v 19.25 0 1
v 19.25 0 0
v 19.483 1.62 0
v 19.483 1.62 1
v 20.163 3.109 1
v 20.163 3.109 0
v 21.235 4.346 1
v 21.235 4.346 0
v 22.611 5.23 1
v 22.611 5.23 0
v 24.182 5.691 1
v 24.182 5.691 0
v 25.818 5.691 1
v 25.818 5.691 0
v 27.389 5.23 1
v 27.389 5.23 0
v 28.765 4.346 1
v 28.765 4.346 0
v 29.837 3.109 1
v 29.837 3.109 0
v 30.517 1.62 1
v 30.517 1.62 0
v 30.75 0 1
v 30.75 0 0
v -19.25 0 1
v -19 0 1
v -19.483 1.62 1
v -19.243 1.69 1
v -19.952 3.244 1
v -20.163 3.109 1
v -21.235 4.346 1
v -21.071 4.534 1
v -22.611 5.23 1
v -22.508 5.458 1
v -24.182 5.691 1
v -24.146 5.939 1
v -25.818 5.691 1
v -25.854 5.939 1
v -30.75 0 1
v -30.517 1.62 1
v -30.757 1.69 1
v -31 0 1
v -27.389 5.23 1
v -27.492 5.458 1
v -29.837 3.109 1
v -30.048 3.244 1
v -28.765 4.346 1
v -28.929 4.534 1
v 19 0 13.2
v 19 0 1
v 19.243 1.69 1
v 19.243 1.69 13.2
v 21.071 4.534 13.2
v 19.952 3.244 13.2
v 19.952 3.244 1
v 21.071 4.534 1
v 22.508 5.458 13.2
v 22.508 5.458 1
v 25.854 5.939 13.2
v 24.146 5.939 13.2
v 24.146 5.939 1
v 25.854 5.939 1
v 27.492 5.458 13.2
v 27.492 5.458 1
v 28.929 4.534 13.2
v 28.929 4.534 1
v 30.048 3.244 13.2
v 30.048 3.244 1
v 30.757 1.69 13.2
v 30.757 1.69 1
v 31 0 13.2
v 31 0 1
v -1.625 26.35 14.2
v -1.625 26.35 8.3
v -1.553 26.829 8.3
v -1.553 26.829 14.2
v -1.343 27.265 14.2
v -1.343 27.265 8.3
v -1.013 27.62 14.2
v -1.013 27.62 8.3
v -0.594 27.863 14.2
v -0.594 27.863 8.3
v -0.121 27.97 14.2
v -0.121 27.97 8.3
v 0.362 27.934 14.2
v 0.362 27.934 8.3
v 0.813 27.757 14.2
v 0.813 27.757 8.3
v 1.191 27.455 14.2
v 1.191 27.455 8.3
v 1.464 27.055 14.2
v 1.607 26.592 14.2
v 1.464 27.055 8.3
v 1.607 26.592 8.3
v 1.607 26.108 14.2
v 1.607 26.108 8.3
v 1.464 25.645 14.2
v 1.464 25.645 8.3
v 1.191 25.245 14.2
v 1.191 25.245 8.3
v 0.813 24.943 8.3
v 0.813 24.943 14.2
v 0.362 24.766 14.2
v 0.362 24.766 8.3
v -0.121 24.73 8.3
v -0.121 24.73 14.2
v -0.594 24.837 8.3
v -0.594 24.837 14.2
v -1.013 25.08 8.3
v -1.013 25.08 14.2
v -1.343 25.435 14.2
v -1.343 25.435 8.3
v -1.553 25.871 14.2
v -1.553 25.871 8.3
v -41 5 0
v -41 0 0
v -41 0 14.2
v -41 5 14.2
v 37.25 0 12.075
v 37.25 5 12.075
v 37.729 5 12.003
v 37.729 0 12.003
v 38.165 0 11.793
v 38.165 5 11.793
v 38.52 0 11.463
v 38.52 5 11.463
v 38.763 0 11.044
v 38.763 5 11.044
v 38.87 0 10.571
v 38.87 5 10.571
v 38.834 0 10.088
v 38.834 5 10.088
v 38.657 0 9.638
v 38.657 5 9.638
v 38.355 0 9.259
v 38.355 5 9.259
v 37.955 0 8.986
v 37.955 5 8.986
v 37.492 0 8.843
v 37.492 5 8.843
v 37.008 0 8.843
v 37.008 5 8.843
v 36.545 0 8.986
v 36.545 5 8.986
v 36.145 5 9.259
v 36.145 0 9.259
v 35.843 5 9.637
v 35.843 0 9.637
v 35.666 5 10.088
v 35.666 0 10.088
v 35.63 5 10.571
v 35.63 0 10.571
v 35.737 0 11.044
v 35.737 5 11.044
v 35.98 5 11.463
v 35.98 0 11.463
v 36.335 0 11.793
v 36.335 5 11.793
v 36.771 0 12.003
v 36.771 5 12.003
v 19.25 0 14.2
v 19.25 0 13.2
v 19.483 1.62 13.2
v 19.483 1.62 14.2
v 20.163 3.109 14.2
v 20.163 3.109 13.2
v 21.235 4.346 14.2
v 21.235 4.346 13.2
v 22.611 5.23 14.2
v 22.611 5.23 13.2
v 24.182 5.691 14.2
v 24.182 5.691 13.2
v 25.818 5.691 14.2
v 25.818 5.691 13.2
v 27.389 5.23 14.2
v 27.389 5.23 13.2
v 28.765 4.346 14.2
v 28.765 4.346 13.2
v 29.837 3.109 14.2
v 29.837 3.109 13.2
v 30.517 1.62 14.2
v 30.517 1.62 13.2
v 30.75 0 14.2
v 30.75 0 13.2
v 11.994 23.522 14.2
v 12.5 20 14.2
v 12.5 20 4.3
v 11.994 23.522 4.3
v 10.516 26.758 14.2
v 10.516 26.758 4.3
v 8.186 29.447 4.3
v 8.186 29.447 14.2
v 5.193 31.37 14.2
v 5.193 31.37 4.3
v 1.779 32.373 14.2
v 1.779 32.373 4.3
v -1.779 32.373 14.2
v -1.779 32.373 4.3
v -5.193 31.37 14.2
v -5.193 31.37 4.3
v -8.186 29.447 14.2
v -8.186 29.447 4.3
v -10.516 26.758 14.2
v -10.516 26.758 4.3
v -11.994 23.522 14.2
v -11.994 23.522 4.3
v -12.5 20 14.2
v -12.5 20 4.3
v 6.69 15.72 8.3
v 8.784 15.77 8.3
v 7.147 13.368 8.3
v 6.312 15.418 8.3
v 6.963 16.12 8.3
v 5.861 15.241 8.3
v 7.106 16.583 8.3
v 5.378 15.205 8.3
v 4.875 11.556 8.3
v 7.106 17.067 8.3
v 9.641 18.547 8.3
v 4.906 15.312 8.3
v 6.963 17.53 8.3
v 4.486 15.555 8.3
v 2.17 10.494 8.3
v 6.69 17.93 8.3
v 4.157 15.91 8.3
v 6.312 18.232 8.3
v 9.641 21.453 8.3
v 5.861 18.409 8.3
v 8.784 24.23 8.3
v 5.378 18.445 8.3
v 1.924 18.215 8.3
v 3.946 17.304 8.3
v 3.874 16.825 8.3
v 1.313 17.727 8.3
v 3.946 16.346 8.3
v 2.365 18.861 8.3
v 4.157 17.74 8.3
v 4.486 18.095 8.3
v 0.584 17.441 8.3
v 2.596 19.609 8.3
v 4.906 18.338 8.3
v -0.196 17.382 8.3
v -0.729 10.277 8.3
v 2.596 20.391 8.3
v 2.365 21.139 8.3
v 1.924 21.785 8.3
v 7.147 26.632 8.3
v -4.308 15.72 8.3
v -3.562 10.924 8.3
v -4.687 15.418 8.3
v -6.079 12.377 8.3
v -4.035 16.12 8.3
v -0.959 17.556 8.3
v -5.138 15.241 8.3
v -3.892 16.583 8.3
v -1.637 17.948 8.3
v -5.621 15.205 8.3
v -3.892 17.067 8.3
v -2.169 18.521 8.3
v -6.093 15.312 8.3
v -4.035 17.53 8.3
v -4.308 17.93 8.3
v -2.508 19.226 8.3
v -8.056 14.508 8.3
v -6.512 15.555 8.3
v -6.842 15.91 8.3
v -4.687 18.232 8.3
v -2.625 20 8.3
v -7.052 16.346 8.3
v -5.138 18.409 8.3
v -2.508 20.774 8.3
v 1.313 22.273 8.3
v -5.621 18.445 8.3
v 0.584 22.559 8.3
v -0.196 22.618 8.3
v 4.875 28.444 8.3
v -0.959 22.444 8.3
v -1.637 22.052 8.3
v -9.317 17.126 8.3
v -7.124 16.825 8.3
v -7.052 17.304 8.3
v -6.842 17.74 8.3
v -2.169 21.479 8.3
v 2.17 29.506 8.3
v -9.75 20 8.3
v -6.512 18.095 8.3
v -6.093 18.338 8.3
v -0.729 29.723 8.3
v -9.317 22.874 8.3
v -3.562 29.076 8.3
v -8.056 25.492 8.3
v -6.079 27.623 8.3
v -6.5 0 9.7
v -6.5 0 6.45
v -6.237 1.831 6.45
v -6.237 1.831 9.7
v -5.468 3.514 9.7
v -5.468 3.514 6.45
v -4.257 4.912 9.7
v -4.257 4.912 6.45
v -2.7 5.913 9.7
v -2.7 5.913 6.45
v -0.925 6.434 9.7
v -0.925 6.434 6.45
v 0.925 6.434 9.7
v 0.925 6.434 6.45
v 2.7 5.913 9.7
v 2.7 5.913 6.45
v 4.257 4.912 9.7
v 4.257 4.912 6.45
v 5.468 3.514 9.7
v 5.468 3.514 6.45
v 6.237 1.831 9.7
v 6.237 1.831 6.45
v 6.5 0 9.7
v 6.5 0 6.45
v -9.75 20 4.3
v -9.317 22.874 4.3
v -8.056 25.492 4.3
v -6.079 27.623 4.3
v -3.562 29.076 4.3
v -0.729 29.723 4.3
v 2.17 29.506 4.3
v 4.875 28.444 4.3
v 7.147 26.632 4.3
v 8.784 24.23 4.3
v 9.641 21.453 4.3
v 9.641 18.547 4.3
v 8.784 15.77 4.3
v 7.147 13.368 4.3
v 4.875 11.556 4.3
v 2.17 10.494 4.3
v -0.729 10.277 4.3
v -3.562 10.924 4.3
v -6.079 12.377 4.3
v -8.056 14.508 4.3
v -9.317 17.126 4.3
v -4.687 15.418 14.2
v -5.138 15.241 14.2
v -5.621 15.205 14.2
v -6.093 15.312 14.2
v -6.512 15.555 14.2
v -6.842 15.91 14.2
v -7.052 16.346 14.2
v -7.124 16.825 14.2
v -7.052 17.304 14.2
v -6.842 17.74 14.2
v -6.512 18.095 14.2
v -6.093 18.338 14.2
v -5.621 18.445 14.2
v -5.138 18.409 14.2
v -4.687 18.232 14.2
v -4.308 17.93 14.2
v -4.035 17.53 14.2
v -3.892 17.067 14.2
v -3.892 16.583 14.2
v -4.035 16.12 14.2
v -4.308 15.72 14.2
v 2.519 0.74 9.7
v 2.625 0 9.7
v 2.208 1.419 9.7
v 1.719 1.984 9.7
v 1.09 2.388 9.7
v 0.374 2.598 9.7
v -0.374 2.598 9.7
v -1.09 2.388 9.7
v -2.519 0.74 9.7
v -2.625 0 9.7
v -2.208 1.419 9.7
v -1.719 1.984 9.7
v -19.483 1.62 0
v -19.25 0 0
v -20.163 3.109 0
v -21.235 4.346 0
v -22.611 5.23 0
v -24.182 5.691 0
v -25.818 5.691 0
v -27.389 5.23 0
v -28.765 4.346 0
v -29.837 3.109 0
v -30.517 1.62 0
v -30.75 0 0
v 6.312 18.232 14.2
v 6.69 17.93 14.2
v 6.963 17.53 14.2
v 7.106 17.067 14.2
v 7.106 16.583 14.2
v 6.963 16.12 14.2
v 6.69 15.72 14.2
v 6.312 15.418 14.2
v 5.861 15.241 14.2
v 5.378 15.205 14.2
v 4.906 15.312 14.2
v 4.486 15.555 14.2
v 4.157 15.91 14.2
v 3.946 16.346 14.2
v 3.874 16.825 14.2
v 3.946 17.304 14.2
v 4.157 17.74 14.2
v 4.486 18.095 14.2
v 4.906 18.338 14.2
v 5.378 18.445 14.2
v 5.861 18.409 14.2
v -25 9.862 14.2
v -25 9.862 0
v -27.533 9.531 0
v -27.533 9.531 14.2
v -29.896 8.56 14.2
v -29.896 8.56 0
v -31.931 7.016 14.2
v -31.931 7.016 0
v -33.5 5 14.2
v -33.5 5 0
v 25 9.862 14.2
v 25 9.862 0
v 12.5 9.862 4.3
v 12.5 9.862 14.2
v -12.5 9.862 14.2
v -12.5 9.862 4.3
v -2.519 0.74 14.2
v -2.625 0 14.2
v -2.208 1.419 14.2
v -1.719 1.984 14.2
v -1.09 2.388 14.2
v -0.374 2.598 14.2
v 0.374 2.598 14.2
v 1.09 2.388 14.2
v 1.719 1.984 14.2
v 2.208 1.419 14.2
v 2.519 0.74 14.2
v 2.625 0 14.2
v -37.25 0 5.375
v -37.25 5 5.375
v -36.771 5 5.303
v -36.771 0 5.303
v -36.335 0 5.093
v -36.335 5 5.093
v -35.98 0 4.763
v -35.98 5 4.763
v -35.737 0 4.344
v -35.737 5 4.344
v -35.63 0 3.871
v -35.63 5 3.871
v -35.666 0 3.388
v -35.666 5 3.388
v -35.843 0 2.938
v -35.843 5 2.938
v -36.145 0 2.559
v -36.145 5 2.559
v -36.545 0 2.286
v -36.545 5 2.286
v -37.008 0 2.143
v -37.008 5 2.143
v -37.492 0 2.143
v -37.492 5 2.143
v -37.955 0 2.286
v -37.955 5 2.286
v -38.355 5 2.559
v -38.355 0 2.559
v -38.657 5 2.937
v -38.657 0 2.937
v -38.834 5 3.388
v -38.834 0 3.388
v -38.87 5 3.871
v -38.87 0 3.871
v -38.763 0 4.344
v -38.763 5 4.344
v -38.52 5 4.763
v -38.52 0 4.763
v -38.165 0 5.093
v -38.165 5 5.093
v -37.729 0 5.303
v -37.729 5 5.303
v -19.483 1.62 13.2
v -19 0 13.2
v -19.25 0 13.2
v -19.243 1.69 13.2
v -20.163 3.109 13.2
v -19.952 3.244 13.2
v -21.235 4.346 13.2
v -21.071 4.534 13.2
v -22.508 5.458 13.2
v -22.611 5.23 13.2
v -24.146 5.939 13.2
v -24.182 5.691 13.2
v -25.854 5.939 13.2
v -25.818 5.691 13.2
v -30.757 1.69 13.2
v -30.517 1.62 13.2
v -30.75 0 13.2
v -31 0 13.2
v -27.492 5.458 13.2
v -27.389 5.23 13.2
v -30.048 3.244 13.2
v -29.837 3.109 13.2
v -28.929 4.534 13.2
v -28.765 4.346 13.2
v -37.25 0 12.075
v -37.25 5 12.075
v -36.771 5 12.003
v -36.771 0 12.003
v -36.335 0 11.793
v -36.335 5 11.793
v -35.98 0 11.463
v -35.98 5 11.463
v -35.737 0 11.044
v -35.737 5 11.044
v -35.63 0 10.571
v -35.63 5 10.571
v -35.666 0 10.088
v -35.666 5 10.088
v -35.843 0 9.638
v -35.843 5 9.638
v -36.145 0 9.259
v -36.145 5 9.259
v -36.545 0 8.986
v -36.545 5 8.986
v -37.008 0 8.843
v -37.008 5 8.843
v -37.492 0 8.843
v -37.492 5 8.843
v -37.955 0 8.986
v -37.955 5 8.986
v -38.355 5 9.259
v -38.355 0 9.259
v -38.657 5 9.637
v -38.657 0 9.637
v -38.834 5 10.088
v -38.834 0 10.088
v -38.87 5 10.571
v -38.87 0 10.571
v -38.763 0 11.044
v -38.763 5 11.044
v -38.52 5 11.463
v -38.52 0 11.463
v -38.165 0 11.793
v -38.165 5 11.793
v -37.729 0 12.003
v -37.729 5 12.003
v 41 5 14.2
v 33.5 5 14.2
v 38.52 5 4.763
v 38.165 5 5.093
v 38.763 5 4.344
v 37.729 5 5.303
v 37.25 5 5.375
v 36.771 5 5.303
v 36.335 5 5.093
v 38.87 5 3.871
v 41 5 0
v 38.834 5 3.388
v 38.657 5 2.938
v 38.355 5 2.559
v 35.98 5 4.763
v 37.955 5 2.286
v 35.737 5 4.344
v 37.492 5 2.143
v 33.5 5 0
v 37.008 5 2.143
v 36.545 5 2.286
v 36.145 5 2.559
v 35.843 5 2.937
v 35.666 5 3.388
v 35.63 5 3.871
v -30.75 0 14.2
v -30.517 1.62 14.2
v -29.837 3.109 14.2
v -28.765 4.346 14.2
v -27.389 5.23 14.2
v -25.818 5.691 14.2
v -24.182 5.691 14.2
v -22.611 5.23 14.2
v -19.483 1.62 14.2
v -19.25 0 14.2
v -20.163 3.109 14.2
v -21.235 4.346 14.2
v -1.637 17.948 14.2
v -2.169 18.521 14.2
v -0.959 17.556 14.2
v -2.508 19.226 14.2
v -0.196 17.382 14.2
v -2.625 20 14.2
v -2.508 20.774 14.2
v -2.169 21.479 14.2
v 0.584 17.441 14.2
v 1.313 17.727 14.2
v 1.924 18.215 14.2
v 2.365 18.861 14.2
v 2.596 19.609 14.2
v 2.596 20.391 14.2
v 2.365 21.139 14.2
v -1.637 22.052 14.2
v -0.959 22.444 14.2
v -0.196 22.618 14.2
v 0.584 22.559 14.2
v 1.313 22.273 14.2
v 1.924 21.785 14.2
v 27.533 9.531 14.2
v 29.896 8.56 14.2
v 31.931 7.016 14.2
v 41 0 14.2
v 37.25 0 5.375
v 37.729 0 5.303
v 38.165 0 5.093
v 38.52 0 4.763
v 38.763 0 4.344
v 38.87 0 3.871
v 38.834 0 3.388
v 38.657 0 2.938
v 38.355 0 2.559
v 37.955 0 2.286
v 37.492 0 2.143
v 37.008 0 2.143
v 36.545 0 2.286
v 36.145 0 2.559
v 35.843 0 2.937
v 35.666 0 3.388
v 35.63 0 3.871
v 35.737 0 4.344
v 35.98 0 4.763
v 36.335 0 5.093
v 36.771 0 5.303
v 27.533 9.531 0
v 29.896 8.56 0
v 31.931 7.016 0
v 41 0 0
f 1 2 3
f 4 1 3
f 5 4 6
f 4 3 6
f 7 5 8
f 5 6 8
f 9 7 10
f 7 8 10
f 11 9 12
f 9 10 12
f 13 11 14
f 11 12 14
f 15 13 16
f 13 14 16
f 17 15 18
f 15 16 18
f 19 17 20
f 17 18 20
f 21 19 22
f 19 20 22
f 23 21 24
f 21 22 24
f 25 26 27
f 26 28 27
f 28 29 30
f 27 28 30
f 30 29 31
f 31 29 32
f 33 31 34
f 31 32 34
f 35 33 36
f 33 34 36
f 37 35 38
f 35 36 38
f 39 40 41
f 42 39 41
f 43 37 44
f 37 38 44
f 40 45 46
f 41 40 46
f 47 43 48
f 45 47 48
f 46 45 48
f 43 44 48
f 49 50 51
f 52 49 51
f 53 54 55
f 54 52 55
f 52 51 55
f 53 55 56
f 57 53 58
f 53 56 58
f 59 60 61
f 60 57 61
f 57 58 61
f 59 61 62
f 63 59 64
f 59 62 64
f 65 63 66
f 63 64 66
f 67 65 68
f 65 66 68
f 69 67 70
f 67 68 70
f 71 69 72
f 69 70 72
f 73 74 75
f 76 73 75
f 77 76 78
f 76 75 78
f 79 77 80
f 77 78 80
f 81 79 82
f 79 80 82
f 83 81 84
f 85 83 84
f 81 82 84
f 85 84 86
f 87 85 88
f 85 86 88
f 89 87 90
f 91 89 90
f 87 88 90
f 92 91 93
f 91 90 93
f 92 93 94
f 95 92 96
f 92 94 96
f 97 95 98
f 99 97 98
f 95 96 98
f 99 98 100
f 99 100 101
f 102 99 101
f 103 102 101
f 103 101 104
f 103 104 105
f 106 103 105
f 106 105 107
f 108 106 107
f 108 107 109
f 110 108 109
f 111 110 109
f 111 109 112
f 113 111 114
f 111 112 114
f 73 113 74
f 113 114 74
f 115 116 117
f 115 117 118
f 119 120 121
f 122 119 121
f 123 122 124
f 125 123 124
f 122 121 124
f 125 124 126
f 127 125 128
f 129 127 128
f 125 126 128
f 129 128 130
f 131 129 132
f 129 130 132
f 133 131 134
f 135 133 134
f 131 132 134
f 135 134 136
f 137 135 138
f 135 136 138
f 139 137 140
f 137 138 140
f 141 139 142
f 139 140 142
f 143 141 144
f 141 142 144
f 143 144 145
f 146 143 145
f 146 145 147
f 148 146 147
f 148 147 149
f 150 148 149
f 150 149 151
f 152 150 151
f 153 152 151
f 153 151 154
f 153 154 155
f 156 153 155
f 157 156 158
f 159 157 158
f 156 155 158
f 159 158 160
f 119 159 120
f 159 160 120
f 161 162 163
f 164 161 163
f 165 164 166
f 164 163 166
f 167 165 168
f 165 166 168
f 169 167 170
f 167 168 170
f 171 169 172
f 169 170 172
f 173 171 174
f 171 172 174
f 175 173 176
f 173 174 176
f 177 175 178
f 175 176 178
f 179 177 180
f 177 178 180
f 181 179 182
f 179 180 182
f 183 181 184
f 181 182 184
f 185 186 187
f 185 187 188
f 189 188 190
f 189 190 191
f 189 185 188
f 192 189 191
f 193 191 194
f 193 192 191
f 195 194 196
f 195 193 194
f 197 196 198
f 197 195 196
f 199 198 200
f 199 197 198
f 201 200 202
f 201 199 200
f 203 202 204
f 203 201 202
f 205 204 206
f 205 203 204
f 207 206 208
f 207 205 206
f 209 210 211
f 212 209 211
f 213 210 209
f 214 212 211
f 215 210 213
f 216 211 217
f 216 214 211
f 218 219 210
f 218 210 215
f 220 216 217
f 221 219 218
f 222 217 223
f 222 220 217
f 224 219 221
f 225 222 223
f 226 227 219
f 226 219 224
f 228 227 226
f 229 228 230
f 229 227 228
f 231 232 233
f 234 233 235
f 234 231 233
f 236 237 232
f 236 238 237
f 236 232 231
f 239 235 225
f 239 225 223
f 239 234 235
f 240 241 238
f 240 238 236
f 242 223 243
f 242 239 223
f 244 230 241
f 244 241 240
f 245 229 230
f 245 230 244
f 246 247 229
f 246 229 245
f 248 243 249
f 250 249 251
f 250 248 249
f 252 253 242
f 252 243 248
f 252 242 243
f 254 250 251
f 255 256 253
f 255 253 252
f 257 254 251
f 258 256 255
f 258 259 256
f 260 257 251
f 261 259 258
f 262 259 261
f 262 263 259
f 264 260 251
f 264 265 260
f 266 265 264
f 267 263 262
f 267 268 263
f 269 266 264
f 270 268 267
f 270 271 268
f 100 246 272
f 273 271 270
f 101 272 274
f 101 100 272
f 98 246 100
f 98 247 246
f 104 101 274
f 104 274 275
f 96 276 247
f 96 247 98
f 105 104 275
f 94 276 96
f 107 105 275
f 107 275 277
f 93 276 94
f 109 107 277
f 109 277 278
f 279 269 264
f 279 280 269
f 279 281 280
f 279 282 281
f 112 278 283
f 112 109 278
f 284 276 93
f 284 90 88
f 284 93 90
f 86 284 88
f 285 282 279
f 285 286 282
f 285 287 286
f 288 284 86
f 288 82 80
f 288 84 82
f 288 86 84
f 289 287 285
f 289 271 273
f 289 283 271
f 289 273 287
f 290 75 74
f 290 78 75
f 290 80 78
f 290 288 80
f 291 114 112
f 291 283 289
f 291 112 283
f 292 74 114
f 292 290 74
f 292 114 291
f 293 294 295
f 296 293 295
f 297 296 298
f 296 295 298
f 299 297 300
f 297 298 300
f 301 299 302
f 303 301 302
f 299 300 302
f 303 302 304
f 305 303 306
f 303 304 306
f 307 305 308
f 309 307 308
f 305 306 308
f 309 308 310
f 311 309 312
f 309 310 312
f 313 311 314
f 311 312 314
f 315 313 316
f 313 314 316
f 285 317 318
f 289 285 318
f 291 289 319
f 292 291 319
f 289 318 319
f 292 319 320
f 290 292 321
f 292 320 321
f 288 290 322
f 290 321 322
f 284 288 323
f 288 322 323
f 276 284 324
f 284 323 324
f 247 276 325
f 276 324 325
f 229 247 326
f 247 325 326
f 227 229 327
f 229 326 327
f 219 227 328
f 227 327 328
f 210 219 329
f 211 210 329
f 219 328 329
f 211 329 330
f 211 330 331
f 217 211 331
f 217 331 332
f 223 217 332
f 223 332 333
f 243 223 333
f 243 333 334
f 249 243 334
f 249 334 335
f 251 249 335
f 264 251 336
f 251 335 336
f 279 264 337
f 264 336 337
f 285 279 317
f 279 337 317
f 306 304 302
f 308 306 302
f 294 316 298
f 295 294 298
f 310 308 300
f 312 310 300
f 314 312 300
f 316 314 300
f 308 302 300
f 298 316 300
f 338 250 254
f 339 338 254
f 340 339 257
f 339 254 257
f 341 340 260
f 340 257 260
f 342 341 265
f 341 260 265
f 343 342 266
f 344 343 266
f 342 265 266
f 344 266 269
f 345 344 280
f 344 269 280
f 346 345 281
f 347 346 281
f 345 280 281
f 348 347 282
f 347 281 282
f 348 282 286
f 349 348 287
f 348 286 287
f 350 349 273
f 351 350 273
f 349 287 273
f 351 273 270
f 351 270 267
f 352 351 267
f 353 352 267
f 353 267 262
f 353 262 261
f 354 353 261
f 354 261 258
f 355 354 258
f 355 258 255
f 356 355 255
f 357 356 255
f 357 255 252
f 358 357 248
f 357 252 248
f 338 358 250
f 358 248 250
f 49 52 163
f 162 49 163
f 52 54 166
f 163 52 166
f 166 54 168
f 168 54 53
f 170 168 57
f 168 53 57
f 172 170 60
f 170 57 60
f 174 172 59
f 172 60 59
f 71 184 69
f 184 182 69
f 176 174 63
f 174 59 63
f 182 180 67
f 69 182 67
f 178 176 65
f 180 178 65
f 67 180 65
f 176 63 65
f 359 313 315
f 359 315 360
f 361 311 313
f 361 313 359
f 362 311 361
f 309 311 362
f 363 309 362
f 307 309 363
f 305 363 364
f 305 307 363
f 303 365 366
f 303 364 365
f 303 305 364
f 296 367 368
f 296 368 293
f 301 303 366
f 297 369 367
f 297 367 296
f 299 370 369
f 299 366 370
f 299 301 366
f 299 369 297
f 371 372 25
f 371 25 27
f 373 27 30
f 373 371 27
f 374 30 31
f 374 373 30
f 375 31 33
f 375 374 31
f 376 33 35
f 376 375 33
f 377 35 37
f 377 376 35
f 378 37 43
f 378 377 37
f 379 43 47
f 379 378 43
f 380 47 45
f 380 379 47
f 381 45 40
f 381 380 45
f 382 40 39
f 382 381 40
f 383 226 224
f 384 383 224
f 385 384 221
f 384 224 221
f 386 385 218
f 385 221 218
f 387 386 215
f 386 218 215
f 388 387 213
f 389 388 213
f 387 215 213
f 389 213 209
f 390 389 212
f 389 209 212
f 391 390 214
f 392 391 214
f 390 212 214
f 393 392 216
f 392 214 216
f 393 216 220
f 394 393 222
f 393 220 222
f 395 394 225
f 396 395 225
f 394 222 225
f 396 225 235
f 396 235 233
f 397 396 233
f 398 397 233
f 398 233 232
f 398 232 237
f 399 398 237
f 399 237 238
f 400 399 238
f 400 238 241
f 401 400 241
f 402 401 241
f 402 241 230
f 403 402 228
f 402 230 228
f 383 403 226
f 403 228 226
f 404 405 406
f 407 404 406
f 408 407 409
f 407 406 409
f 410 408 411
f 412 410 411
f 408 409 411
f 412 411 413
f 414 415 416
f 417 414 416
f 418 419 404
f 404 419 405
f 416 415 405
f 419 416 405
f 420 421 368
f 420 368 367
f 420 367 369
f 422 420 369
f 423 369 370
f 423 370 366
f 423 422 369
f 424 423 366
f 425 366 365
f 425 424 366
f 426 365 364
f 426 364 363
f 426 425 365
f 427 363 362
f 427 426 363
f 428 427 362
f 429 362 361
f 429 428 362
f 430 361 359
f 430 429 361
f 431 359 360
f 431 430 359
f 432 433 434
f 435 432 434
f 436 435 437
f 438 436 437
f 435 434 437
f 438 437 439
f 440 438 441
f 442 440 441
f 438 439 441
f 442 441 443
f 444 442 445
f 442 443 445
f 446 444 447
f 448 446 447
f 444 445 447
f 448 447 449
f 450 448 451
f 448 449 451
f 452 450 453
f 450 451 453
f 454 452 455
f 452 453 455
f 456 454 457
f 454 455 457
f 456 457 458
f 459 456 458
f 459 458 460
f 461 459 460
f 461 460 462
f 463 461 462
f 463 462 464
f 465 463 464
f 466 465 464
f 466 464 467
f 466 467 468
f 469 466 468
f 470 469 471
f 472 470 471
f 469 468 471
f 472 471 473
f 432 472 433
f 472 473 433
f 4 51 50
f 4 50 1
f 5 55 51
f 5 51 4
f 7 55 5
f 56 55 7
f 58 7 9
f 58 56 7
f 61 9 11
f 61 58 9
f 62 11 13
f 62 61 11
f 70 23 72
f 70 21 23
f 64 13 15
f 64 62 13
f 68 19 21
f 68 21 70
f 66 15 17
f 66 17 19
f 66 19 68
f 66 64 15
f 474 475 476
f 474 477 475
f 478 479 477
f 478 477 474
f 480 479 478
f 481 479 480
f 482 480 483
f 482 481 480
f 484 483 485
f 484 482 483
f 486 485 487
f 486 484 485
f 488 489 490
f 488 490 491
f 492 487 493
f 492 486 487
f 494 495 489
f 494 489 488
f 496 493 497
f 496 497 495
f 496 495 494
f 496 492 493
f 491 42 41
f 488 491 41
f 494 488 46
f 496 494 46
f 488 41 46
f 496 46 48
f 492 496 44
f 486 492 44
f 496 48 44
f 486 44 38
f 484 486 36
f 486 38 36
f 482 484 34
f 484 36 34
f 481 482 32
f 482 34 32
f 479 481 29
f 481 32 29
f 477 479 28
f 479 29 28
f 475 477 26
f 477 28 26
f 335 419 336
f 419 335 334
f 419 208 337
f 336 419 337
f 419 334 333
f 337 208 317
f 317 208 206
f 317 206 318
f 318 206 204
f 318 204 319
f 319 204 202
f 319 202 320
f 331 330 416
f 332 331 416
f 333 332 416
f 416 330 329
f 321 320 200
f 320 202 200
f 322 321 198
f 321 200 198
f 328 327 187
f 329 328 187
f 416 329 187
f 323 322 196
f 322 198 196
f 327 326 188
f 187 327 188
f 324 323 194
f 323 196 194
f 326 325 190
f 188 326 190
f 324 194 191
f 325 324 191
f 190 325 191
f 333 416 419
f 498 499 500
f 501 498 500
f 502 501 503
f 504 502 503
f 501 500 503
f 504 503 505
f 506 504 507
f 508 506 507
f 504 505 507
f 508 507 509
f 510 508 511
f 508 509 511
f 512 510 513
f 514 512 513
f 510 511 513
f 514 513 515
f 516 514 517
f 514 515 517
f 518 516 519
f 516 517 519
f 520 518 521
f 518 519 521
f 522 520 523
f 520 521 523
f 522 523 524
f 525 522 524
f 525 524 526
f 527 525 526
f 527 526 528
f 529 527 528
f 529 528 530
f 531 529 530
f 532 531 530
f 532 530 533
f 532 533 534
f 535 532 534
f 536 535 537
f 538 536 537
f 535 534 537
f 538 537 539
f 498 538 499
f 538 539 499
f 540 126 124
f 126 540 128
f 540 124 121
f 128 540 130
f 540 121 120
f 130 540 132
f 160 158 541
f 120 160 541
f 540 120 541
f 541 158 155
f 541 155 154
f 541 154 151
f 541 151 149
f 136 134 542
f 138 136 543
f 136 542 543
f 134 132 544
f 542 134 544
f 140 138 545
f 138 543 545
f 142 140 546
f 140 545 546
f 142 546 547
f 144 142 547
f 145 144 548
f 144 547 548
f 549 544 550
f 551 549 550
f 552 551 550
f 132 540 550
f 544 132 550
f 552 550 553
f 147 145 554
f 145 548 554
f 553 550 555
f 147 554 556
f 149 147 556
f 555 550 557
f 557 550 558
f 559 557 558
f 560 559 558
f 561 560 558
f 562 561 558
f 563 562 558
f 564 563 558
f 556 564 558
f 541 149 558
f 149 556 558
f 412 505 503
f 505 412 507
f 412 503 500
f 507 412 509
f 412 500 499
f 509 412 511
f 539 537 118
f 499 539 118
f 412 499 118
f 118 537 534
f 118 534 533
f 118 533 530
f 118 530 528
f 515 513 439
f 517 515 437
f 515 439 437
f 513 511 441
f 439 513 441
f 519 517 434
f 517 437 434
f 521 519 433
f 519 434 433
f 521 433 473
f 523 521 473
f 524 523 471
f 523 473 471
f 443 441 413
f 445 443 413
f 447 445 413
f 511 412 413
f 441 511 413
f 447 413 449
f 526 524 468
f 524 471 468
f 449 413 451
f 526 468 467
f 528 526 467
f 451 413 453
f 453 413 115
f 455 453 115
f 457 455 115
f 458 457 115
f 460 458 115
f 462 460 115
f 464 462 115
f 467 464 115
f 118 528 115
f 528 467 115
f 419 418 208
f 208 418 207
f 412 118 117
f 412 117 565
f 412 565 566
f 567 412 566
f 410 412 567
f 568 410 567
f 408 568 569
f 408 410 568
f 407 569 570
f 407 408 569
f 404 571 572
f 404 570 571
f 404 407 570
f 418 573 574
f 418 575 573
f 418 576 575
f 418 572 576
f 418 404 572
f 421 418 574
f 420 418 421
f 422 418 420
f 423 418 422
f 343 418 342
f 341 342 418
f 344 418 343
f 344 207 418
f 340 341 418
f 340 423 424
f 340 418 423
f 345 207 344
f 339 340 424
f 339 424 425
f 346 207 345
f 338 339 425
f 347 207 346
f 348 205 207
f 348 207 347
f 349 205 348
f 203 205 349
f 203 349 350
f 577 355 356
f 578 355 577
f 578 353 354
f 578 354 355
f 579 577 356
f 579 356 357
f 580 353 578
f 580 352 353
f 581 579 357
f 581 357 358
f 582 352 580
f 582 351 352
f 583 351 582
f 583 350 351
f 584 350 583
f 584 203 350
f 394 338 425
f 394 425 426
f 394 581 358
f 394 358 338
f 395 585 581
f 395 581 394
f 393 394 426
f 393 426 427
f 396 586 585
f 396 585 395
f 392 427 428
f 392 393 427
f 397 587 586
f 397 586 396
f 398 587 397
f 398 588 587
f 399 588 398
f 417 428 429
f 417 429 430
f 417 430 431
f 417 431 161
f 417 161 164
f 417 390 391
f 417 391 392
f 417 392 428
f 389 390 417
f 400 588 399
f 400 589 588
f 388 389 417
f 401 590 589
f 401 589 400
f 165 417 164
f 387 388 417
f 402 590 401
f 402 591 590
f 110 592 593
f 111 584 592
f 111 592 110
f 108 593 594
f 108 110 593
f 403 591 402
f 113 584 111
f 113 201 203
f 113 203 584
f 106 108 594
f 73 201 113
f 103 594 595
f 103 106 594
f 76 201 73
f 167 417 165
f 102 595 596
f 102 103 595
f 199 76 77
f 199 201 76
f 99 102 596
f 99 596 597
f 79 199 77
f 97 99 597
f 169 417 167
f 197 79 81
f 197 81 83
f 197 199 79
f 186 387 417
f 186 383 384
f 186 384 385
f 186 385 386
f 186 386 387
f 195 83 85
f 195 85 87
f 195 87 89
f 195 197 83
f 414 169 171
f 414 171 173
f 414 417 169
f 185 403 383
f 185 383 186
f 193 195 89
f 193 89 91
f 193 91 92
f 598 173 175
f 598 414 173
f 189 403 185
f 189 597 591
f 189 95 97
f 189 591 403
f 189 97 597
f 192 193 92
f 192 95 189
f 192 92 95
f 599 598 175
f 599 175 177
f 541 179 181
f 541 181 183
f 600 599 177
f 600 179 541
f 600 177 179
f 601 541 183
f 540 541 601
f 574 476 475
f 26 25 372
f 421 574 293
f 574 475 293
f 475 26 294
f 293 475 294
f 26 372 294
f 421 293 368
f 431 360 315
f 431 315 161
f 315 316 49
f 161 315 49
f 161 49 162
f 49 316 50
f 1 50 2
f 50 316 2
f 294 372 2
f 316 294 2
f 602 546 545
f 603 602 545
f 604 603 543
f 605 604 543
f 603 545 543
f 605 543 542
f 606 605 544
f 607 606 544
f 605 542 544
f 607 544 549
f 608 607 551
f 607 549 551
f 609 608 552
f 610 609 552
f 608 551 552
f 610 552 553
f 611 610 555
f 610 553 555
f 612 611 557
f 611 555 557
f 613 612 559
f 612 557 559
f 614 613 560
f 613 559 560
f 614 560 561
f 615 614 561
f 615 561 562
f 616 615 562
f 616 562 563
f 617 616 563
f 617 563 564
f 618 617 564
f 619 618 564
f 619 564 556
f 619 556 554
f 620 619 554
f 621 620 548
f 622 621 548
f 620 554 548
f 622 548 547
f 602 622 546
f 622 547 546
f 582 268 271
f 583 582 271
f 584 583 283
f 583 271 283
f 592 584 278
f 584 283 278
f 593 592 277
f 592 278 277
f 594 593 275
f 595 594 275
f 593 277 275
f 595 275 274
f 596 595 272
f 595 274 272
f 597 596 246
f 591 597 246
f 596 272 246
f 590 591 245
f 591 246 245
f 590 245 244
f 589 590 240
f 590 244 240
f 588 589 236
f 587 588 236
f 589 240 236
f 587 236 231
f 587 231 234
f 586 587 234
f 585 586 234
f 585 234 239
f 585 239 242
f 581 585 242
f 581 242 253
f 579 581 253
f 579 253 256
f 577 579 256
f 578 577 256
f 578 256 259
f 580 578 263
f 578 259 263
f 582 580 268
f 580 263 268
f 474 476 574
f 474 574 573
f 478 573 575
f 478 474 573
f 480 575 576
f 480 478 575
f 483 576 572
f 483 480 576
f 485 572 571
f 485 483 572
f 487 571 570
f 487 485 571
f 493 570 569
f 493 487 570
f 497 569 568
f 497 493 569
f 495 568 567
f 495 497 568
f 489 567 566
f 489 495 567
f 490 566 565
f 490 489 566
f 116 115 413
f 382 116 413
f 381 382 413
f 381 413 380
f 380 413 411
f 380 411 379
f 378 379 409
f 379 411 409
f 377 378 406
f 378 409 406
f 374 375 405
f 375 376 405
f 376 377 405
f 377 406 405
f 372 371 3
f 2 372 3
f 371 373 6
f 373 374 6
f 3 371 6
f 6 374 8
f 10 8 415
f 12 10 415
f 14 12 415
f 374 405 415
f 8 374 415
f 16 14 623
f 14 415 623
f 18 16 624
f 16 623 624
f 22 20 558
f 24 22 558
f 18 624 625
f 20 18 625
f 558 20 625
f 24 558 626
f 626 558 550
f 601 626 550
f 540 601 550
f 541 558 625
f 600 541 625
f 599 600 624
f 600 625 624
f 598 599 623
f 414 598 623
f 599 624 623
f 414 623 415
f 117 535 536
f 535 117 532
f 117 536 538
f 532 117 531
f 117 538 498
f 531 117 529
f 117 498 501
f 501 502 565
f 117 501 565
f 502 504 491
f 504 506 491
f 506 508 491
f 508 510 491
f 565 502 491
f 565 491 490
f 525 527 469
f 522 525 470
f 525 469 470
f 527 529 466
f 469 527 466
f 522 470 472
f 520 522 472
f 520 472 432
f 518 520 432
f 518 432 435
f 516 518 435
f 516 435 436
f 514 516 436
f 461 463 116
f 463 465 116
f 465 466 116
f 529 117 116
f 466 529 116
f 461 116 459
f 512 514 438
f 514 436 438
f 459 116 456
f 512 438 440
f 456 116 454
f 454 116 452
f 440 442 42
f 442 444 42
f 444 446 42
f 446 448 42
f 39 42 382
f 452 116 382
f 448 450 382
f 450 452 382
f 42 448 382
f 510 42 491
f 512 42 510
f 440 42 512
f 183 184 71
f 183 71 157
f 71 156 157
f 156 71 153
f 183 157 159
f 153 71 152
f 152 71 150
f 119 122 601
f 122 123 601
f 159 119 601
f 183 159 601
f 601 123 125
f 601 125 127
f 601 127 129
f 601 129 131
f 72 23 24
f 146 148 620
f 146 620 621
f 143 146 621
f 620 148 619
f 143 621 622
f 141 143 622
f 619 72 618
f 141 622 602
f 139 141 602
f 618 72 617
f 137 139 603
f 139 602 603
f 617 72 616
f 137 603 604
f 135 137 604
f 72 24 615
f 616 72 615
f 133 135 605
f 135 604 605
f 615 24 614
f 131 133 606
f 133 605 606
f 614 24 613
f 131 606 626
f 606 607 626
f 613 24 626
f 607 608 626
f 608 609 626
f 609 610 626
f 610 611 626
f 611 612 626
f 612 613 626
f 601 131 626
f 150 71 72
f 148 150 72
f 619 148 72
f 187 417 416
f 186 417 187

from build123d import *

# Parameters (mm, degrees)
SKETCH1_W           = 82
SKETCH1_H           = 25
BOSS_EXTRUDE1_DEPTH = 14.2
CUT_EXTRUDE3_DEPTH  = 14.2
BOSS_EXTRUDE2_DEPTH = 1
BOSS_EXTRUDE3_START = -13.2
BOSS_EXTRUDE3_DEPTH = 1
CUT_EXTRUDE4_START  = -6.45
CUT_EXTRUDE4_DEPTH  = 3.25
CUT_EXTRUDE5_DEPTH  = 4.5
CUT_EXTRUDE6_DEPTH  = 14.2
SKETCH8_R           = 1.625
CUT_EXTRUDE7_DEPTH  = 5
SKETCH10_W          = 25
SKETCH10_H          = 10.138458538
BOSS_EXTRUDE4_DEPTH = 9.9
SKETCH11_R          = 9.75
CUT_EXTRUDE8_DEPTH  = 4
SKETCH12_R          = 1.625
CUT_EXTRUDE9_DEPTH  = 5.9
CIRPATTERN1_COUNT   = 3
SKETCH13_R          = 2.625
CUT_EXTRUDE10_DEPTH = 5.9


with BuildPart() as part:
    # Sketch1 → Boss-Extrude1 (new body)
    with BuildSketch(Plane.XY):
        with Locations((0, 12.5)):
            Rectangle(SKETCH1_W, SKETCH1_H)
    extrude(amount=BOSS_EXTRUDE1_DEPTH)

    # Sketch2 → Cut-Extrude3 (cut)
    with BuildSketch(Plane(origin=(0, 0, 0), x_dir=(-1, 0, 0), z_dir=(0, 0, -1))):
        with BuildLine():
            Line((-31, 0), (-19, 0))
            ThreePointArc((-19, 0), (-25, 6), (-31, 0))
        make_face()
        with BuildLine():
            Line((19, 0), (31, 0))
            ThreePointArc((31, 0), (25, 6), (19, 0))
        make_face()
    extrude(amount=-CUT_EXTRUDE3_DEPTH, mode=Mode.SUBTRACT)

    # Sketch4 → Boss-Extrude2 (add)
    with BuildSketch(Plane(origin=(0, 0, 0), x_dir=(-1, 0, 0), z_dir=(0, 0, -1))):
        with BuildLine():
            Line((-30.75, 0), (-31, 0))
            ThreePointArc((-31, 0), (-25, 6), (-19, 0))
            Line((-19, 0), (-19.25, 0))
            ThreePointArc((-19.25, 0), (-25, 5.75), (-30.75, 0))
        make_face()
        with BuildLine():
            Line((19, 0), (19.25, 0))
            ThreePointArc((19.25, 0), (25, 5.75), (30.75, 0))
            Line((30.75, 0), (31, 0))
            ThreePointArc((31, 0), (25, 6), (19, 0))
        make_face()
    extrude(amount=-BOSS_EXTRUDE2_DEPTH)

    # Sketch4<2> → Boss-Extrude3 (add)
    with BuildSketch(Plane(origin=(0, 0, 0), x_dir=(-1, 0, 0), z_dir=(0, 0, -1)).offset(BOSS_EXTRUDE3_START)):
        with BuildLine():
            Line((-30.75, 0), (-31, 0))
            ThreePointArc((-31, 0), (-25, 6), (-19, 0))
            Line((-19, 0), (-19.25, 0))
            ThreePointArc((-19.25, 0), (-25, 5.75), (-30.75, 0))
        make_face()
        with BuildLine():
            Line((19, 0), (19.25, 0))
            ThreePointArc((19.25, 0), (25, 5.75), (30.75, 0))
            Line((30.75, 0), (31, 0))
            ThreePointArc((31, 0), (25, 6), (19, 0))
        make_face()
    extrude(amount=-BOSS_EXTRUDE3_DEPTH)

    # Sketch5 → Cut-Extrude4 (cut)
    with BuildSketch(Plane(origin=(0, 0, 0), x_dir=(-1, 0, 0), z_dir=(0, 0, -1)).offset(CUT_EXTRUDE4_START)):
        with BuildLine():
            Line((-6.5, 0), (6.5, 0))
            ThreePointArc((6.5, 0), (0, 6.5), (-6.5, 0))
        make_face()
    extrude(amount=-CUT_EXTRUDE4_DEPTH, mode=Mode.SUBTRACT)

    # Sketch6 → Cut-Extrude5 (cut)
    with BuildSketch(Plane(origin=(0, 0, 14.2), x_dir=(-1, 0, 0), z_dir=(0, 0, -1))):
        with BuildLine():
            Line((-2.625, 0), (2.625, 0))
            ThreePointArc((2.625, 0), (0, 2.625), (-2.625, 0))
        make_face()
    extrude(amount=CUT_EXTRUDE5_DEPTH, mode=Mode.SUBTRACT)

    # Sketch7 → Cut-Extrude6 (cut)
    with BuildSketch(Plane(origin=(0, 0, 0), x_dir=(-1, 0, 0), z_dir=(0, 0, -1))):
        with BuildLine():
            Line((-41, 5), (-33.5, 5))
            ThreePointArc((-33.5, 5), (-29.896033736, 8.560306867), (-25, 9.861541462))
            Line((-25, 9.861541462), (25, 9.861541462))
            ThreePointArc((25, 9.861541462), (29.896033736, 8.560306867), (33.5, 5))
            Line((33.5, 5), (41, 5))
            Line((41, 5), (41, 25))
            Line((41, 25), (-41, 25))
            Line((-41, 25), (-41, 5))
        make_face()
    extrude(amount=-CUT_EXTRUDE6_DEPTH, mode=Mode.SUBTRACT)

    # Sketch8 → Cut-Extrude7 (cut)
    with BuildSketch(Plane(origin=(0, 5, 0), x_dir=(1, 0, 0), z_dir=(0, 1, 0))):
        with Locations(Location((37.25, -3.75, 0), (0, 0, 270))):
            Circle(SKETCH8_R)
        with Locations(Location((37.25, -10.45, 0), (0, 0, 270))):
            Circle(SKETCH8_R)
        with Locations(Location((-37.25, -3.75, 0), (0, 0, 270))):
            Circle(SKETCH8_R)
        with Locations(Location((-37.25, -10.45, 0), (0, 0, 270))):
            Circle(SKETCH8_R)
    extrude(amount=-CUT_EXTRUDE7_DEPTH, mode=Mode.SUBTRACT)

    # Sketch10 → Boss-Extrude4 (add)
    with BuildSketch(Plane.XY.offset(14.2)):
        with Locations((0, 14.930770731)):
            Rectangle(SKETCH10_W, SKETCH10_H)
        with BuildLine():
            Line((-12.5, 20), (12.5, 20))
            ThreePointArc((12.5, 20), (0, 32.5), (-12.5, 20))
        make_face()
    extrude(amount=-BOSS_EXTRUDE4_DEPTH)

    # Sketch11 → Cut-Extrude8 (cut)
    with BuildSketch(Plane(origin=(0, 0, 4.3), x_dir=(-1, 0, 0), z_dir=(0, 0, -1))):
        with Locations((0, 20)):
            Circle(SKETCH11_R)
    extrude(amount=-CUT_EXTRUDE8_DEPTH, mode=Mode.SUBTRACT)

    # Sketch12 → Cut-Extrude9 (cut)
    with BuildSketch(Plane(origin=(0, 0, 8.3), x_dir=(-1, 0, 0), z_dir=(0, 0, -1))):
        with Locations((0, 26.35)):
            Circle(SKETCH12_R)
    cut_extrude9 = extrude(amount=-CUT_EXTRUDE9_DEPTH, mode=Mode.SUBTRACT)

    # CirPattern1: Cut-Extrude9 ×3 about axis
    cirpattern1_axis = Axis((0, 20, 0), (0, 0, 1))
    for i in range(1, CIRPATTERN1_COUNT):
        add(cut_extrude9.rotate(cirpattern1_axis, i * 360 / CIRPATTERN1_COUNT), mode=Mode.SUBTRACT)

    # Sketch13 → Cut-Extrude10 (cut)
    with BuildSketch(Plane(origin=(0, 0, 8.3), x_dir=(-1, 0, 0), z_dir=(0, 0, -1))):
        with Locations((0, 20)):
            Circle(SKETCH13_R)
    extrude(amount=-CUT_EXTRUDE10_DEPTH, mode=Mode.SUBTRACT)


solid = part.part
